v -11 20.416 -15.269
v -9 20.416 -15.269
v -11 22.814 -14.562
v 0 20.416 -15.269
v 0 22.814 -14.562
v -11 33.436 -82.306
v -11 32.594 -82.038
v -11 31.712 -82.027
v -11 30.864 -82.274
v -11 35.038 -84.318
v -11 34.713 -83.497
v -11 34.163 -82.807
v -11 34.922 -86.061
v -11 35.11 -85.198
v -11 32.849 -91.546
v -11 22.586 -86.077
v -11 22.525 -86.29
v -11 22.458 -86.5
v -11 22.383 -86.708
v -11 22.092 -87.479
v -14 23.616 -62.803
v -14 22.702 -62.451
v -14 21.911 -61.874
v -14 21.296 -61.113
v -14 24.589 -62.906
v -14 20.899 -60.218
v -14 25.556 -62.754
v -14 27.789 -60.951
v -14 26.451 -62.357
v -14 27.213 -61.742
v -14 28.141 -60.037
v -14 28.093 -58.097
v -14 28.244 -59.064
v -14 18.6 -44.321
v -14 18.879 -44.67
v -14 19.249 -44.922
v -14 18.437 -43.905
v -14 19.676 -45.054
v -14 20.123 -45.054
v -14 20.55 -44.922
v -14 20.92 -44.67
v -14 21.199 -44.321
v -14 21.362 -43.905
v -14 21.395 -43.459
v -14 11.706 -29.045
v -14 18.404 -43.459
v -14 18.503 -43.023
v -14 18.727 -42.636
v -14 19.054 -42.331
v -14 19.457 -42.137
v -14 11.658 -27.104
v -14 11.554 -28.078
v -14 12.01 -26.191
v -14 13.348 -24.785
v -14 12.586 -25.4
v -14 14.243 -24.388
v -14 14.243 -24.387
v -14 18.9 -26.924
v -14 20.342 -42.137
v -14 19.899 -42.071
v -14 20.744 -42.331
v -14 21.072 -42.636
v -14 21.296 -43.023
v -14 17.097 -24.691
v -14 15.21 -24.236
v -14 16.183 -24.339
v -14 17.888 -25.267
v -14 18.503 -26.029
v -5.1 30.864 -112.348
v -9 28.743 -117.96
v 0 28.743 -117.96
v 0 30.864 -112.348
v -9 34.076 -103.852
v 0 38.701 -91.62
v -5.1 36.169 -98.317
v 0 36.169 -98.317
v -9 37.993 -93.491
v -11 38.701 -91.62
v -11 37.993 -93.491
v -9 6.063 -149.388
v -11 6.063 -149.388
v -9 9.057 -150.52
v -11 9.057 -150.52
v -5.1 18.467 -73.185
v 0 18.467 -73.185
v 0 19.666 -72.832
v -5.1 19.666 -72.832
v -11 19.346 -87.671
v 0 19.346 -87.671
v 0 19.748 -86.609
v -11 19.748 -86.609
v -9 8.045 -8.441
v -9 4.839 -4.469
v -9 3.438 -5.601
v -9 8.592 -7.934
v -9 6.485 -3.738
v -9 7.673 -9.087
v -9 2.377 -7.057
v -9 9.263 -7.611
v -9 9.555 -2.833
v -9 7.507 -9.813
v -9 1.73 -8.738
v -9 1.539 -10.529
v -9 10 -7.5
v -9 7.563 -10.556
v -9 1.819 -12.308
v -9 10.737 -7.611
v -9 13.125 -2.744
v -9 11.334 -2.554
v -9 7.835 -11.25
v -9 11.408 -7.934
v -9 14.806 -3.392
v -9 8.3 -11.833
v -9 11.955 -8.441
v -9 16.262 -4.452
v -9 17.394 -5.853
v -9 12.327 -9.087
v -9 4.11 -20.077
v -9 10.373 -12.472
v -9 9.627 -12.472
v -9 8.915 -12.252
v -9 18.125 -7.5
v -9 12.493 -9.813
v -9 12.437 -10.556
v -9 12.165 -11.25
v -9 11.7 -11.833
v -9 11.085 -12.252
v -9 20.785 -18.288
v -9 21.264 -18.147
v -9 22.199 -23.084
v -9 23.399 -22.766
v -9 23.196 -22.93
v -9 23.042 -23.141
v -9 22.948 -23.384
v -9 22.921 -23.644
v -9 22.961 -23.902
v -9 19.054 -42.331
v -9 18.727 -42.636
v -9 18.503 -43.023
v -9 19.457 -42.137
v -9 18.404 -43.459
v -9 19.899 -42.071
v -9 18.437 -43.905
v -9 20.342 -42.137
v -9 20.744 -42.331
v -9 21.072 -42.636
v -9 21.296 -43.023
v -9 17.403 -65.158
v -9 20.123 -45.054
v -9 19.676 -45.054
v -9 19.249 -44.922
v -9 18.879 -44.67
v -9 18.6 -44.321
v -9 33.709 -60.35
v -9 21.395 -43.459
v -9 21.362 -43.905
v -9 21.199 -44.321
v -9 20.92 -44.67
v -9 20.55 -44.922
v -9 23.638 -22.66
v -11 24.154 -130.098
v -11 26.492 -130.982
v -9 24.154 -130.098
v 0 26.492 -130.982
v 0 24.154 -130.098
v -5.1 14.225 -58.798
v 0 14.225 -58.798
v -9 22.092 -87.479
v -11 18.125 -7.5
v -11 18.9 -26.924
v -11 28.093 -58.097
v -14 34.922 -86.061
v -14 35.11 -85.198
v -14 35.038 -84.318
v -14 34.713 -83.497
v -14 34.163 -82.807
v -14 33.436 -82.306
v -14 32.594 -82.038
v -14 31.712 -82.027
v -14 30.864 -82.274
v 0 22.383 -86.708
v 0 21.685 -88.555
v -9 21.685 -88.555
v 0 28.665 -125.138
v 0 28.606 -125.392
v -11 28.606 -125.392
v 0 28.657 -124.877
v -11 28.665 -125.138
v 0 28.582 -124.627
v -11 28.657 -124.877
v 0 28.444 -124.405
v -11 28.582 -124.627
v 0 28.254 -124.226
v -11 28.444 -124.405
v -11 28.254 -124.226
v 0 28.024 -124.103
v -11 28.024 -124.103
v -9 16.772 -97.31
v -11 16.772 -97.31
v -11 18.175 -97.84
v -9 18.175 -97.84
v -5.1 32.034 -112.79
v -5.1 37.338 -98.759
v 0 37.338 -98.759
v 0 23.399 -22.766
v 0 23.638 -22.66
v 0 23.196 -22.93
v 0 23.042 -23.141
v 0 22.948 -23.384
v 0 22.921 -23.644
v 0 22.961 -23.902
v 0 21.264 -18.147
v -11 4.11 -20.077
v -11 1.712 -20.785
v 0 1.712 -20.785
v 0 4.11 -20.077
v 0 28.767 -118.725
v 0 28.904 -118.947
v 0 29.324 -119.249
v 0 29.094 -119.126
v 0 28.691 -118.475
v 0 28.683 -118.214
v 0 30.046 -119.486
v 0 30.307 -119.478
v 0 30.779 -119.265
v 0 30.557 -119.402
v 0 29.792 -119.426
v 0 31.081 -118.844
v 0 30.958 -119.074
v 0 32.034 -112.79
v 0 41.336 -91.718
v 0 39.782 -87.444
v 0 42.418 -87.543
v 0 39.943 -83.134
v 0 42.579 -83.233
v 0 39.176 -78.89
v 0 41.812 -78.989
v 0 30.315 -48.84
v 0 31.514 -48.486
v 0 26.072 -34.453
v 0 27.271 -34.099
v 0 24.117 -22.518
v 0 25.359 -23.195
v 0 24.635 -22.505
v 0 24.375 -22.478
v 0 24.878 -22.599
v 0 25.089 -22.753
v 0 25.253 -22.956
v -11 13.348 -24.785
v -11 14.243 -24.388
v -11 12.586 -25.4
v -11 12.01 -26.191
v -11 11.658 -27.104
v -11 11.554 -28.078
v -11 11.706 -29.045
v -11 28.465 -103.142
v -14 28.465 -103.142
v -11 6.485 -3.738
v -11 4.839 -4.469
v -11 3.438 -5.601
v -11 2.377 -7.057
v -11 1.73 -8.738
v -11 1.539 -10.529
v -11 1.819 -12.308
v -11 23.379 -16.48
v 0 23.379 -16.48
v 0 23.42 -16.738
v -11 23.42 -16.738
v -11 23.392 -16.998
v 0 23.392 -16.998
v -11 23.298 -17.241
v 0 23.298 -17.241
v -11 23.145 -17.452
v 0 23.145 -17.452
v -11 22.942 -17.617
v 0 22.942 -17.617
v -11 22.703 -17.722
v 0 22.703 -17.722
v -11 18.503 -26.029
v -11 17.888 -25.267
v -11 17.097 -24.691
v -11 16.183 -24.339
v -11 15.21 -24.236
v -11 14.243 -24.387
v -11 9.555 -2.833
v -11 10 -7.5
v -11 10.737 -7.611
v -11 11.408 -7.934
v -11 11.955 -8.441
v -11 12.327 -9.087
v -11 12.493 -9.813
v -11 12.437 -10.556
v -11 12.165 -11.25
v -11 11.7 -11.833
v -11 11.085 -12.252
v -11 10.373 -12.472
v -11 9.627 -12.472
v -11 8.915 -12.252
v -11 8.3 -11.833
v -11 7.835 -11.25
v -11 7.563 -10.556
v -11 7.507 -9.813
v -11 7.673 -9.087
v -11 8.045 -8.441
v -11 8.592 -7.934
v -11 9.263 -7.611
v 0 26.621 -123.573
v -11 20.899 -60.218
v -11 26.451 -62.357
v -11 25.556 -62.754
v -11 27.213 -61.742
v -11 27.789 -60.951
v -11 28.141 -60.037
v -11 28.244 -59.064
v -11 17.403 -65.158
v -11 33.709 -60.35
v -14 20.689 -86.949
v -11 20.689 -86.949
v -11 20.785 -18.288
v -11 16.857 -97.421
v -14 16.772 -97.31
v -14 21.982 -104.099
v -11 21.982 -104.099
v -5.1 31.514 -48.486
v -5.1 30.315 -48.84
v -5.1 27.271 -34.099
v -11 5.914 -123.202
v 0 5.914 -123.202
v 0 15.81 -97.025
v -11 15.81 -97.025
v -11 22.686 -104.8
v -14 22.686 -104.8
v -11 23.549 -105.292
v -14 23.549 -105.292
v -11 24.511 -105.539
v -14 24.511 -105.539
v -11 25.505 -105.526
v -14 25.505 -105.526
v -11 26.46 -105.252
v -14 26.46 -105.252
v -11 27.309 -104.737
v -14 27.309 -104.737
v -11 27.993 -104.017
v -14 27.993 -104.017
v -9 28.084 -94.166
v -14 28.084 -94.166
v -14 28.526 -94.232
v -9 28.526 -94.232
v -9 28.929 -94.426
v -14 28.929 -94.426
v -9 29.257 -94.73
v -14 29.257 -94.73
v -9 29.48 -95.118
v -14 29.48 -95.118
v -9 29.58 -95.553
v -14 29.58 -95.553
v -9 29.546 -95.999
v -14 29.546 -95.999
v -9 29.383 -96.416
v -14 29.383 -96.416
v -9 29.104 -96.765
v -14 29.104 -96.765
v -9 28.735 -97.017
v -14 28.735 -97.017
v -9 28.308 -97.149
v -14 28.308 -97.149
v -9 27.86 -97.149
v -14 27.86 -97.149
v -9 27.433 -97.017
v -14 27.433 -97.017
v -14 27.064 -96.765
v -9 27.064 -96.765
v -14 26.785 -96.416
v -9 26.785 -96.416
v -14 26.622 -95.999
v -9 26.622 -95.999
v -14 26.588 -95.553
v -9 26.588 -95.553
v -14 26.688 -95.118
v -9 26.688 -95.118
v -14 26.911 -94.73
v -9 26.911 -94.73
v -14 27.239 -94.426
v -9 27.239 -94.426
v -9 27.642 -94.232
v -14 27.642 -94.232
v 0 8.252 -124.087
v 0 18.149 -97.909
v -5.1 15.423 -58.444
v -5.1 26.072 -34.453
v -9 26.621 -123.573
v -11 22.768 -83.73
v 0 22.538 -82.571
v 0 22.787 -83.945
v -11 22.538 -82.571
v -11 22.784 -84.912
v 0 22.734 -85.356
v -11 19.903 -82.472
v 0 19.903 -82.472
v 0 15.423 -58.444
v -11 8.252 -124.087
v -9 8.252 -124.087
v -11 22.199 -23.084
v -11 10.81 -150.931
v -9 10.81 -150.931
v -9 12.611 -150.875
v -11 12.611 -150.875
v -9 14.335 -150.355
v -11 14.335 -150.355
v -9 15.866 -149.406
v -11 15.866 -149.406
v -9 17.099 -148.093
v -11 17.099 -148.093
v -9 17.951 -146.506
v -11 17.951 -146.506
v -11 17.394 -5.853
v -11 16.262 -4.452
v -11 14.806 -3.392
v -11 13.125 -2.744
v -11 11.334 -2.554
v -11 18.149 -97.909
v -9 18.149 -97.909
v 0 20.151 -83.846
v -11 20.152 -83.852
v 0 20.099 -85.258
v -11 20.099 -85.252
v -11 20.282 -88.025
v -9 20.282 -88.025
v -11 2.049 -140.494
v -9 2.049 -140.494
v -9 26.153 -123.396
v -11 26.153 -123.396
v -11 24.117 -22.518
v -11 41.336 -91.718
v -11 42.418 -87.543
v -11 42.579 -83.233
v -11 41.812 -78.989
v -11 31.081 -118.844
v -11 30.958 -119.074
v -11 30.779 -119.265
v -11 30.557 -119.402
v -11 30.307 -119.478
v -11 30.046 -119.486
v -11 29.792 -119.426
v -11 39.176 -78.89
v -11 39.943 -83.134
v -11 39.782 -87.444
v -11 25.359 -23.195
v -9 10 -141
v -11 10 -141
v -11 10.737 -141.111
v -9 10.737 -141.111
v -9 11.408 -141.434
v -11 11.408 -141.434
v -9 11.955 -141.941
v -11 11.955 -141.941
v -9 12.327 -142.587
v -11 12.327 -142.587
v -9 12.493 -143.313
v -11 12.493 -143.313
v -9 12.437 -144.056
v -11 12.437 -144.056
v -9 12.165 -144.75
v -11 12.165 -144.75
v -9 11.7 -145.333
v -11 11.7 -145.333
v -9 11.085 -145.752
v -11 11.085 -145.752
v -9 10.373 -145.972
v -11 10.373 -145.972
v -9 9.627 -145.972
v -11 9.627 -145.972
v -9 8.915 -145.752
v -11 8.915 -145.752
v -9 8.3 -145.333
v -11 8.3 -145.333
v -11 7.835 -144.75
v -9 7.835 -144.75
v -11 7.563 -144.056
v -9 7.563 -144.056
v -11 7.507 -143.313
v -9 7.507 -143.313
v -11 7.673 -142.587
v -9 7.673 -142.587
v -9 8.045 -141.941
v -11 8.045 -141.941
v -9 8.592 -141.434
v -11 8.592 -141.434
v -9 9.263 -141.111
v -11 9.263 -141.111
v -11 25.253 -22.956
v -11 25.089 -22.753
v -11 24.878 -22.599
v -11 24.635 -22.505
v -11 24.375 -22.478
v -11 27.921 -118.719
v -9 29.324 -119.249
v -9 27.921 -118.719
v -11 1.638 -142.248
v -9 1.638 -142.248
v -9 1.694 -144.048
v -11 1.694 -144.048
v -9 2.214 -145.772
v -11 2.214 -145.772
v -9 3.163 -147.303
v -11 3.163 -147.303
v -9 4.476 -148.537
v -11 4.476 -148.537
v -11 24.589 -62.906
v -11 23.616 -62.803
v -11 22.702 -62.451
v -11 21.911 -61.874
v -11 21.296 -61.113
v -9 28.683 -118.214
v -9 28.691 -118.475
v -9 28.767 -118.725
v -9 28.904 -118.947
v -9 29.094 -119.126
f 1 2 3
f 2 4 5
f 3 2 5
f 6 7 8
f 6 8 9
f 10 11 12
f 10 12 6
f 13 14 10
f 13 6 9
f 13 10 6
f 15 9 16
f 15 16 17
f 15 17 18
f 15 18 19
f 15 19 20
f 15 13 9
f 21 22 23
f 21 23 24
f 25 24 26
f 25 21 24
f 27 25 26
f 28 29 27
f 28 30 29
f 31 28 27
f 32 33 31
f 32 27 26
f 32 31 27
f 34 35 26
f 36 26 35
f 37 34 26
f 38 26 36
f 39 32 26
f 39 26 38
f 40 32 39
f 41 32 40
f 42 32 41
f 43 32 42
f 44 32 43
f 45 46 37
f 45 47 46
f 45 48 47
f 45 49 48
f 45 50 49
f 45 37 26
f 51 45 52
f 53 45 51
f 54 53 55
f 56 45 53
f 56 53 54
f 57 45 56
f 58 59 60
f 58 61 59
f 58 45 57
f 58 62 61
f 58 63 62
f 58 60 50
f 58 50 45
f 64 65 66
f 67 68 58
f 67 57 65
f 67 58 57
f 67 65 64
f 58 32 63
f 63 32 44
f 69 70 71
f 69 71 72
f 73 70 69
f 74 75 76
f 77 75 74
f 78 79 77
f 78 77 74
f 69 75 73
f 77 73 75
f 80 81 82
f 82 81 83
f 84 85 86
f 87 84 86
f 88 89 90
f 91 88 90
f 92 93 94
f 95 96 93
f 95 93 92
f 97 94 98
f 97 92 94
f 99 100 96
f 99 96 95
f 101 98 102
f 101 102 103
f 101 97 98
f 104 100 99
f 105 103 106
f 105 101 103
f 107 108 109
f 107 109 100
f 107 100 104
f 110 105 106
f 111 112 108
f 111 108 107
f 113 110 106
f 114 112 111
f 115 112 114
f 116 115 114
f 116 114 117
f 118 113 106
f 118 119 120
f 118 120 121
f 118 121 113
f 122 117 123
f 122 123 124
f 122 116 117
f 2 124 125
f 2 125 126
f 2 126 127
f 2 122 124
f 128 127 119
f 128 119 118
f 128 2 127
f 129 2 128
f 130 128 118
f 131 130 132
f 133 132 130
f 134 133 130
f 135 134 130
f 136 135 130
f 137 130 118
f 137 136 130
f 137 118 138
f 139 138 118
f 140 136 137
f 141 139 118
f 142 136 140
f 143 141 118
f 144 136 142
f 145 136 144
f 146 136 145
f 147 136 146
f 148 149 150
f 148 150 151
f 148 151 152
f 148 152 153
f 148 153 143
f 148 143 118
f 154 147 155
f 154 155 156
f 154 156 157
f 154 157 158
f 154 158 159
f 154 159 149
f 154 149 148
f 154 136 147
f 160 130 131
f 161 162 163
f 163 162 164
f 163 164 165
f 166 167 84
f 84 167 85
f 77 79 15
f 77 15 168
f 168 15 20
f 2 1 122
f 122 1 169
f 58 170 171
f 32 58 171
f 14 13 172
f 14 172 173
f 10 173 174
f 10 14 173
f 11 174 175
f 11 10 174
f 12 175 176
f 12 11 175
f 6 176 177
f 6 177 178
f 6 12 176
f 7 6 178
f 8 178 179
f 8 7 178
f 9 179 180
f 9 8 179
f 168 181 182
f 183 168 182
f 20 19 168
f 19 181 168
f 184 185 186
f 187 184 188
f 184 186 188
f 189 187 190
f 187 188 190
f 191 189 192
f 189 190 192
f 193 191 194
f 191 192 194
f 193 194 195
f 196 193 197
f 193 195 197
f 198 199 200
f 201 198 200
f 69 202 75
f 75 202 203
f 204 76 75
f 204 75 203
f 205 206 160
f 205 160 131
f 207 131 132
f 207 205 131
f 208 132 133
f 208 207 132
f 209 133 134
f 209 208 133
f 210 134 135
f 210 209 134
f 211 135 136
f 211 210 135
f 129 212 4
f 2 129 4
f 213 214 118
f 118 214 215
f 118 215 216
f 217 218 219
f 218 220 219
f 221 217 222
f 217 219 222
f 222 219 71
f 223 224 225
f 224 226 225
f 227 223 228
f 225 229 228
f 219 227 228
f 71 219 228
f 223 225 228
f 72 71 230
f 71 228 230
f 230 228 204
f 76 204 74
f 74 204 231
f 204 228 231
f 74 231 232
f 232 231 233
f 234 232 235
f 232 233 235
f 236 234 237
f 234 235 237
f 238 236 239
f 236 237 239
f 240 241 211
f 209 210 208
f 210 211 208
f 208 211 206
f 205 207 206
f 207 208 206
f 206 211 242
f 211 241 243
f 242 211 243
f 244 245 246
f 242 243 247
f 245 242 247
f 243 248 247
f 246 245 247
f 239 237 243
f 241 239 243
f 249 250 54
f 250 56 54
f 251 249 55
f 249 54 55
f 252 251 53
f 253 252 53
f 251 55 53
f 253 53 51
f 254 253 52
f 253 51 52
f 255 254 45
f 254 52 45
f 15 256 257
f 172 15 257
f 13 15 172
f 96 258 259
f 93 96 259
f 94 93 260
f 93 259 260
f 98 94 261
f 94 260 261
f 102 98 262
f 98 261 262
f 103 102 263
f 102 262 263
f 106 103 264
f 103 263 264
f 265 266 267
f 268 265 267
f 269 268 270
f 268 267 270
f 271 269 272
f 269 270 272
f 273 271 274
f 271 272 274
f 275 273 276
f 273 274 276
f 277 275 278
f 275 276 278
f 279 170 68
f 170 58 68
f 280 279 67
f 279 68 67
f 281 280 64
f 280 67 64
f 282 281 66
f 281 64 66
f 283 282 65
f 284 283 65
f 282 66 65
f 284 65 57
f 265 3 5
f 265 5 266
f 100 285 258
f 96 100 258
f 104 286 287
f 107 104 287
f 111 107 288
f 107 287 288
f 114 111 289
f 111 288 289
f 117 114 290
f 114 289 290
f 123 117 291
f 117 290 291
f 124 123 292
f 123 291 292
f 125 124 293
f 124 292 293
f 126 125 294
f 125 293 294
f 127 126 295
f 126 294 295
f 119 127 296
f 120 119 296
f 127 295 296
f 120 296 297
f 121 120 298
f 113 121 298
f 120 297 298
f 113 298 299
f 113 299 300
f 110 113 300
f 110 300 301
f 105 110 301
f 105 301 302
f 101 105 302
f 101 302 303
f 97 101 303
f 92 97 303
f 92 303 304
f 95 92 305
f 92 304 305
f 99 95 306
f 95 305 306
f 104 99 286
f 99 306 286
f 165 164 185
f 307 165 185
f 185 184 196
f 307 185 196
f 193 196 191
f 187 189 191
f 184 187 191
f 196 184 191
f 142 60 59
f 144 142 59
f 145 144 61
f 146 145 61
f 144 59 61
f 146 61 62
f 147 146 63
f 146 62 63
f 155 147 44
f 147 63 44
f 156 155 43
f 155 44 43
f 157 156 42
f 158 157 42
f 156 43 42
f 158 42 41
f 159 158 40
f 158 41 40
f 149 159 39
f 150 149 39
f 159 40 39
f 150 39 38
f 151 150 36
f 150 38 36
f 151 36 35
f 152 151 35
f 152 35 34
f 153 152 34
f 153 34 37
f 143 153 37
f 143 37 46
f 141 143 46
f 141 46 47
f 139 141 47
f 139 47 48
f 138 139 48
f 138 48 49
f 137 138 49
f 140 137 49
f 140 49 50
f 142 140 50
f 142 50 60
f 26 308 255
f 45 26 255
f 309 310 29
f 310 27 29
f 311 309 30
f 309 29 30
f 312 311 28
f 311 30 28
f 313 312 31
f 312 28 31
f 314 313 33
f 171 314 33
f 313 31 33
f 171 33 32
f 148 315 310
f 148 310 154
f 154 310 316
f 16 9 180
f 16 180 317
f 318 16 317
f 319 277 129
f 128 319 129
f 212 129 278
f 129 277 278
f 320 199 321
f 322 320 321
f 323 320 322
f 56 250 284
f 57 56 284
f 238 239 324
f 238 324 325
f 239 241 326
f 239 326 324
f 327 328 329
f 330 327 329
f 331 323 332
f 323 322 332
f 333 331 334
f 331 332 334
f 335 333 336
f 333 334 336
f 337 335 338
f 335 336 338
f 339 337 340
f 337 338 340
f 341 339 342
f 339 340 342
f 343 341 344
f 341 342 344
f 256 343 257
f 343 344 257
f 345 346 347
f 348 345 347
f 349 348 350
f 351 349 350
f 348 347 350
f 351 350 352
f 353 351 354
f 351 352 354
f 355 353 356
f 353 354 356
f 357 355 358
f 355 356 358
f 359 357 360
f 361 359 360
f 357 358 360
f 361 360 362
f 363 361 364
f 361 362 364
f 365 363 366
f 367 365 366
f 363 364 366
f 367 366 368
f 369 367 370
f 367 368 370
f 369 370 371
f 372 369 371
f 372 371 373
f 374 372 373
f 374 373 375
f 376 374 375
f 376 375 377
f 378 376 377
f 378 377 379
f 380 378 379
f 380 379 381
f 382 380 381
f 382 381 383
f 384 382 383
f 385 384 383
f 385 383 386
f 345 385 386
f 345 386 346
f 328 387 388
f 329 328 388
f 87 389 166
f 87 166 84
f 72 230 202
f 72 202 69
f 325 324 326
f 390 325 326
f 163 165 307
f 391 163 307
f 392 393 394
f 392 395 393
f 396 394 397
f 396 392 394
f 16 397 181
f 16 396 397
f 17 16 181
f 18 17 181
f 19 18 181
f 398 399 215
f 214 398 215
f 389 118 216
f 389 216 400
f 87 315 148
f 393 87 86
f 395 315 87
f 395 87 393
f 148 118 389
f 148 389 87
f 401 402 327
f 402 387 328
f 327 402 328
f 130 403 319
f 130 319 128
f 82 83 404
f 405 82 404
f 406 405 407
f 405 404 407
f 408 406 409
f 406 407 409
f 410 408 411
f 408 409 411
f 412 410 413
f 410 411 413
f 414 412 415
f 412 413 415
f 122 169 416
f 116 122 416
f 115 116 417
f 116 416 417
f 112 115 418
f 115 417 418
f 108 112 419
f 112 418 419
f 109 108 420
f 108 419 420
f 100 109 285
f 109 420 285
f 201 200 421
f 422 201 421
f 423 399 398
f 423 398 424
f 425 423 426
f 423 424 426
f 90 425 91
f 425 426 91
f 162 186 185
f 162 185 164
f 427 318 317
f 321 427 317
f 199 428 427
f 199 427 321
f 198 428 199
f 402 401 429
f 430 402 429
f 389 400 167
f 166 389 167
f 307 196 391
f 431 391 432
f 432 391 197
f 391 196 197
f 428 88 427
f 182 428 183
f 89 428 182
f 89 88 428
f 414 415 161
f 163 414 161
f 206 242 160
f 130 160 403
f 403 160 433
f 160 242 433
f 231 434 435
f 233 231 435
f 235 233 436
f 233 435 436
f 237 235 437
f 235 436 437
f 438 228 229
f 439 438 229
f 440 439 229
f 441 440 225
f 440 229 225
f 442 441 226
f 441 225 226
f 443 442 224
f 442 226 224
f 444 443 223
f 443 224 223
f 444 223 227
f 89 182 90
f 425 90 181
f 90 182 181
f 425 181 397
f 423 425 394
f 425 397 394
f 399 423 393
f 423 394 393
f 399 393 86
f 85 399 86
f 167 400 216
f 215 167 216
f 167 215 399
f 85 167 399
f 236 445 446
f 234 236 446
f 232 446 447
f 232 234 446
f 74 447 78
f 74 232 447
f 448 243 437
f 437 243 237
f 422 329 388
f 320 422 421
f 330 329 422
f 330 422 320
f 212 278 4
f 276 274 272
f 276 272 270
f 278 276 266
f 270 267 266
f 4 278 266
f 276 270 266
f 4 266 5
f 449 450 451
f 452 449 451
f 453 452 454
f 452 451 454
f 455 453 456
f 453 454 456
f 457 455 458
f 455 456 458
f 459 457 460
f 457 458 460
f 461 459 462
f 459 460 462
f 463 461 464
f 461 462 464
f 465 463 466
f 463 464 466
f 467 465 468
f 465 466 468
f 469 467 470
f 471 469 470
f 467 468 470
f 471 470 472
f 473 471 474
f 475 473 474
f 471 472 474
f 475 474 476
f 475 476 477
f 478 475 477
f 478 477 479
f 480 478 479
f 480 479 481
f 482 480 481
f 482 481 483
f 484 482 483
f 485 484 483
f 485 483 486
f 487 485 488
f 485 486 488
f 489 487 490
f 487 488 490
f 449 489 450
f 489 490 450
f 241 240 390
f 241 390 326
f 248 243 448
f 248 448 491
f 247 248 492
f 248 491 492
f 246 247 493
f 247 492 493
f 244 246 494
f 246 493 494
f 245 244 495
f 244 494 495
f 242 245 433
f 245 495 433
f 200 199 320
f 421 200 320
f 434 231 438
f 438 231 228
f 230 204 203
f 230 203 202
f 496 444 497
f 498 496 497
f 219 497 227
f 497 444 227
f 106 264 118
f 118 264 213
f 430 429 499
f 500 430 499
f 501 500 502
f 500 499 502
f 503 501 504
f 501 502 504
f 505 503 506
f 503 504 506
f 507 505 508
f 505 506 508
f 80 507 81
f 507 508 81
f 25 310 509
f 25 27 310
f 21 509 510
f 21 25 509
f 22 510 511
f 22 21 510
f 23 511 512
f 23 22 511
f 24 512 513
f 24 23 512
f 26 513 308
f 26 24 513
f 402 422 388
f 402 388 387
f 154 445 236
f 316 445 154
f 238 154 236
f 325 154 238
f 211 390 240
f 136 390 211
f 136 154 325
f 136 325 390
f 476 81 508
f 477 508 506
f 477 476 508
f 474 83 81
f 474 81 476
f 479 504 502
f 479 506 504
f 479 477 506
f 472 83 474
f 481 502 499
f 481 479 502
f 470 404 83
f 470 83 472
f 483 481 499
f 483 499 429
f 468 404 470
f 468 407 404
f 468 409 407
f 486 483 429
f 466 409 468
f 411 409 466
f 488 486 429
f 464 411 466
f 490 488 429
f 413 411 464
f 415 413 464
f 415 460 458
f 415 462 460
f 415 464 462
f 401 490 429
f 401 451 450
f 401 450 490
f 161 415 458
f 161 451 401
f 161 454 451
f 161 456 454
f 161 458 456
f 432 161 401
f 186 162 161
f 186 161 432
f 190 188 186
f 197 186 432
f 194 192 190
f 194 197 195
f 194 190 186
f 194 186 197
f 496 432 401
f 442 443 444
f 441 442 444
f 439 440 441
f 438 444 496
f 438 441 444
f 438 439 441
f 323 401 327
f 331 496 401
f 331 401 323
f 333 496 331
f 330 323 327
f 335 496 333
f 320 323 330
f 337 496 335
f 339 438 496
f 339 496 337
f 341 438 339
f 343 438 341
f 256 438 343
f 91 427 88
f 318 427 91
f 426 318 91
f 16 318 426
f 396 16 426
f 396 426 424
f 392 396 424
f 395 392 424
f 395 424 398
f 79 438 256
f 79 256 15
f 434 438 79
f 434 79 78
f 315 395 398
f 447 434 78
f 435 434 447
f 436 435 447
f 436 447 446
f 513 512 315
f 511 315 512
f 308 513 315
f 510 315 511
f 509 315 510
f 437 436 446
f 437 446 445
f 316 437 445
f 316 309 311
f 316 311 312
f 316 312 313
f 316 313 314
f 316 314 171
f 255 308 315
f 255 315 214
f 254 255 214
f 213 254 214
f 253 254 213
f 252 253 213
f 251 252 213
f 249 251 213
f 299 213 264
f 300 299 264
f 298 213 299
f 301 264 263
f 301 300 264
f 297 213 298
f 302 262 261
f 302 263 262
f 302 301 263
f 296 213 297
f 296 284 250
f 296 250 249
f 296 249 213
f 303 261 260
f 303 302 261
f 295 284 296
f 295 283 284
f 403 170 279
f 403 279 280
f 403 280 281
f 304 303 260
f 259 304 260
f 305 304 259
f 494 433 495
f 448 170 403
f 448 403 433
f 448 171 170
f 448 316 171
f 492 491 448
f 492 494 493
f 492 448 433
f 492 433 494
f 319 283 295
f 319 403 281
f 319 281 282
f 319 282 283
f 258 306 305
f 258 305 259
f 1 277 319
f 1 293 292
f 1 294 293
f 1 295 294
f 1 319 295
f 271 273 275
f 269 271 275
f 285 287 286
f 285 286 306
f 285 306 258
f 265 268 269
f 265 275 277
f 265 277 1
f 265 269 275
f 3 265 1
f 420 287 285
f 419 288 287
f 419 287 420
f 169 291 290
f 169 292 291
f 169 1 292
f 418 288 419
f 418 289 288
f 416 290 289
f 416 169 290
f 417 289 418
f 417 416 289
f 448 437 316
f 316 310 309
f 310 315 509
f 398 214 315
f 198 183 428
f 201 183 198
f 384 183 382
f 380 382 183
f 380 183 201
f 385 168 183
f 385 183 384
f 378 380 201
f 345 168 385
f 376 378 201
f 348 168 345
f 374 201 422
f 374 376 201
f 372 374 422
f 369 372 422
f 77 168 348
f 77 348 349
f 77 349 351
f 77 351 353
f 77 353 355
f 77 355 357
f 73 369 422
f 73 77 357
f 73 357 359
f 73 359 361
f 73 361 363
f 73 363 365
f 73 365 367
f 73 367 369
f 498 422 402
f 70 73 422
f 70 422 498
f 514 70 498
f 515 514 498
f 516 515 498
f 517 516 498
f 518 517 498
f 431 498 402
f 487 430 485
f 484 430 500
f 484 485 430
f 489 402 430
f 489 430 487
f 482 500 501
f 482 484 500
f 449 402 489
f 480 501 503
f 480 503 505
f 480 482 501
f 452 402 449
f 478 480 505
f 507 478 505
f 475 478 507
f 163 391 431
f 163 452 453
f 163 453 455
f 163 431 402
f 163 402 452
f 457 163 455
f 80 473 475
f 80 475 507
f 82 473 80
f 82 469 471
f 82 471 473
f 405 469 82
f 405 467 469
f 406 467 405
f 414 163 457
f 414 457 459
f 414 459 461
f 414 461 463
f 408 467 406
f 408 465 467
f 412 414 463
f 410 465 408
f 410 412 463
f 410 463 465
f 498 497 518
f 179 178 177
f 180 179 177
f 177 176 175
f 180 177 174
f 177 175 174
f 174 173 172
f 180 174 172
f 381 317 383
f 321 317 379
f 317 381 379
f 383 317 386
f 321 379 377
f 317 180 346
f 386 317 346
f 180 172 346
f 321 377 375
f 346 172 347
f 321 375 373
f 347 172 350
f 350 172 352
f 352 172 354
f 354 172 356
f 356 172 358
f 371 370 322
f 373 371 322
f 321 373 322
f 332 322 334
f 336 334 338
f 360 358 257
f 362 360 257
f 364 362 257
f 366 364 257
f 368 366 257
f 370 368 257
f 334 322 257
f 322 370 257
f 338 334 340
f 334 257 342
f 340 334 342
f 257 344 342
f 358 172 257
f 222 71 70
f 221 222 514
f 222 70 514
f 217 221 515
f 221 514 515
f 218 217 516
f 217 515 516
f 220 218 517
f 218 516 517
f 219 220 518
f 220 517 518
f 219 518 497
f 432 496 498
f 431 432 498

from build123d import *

# Parameters (mm, degrees)
SWEEP1_PROFILE_R        = 11
CUT_EXTRUDE1_DEPTH      = 139.5211963076765
CUT_EXTRUDE1_DEPTH_BACK = 139.5211963076765
BOSS_EXTRUDE1_DEPTH     = 11
BOSS_EXTRUDE4_DEPTH     = 11
SHELL1_START            = -11
SHELL1_DEPTH            = 11
SHELL1_START_2          = -113.150665538
SHELL1_2_DEPTH          = 47.855548818
SHELL1_START_3          = 20.420083618
SHELL1_3_DEPTH          = 73.048431747
FILLET1_R               = 6.5
BOSS_EXTRUDE2_DEPTH     = 3
CUT_EXTRUDE2_DEPTH      = 13.000000000000002
SKETCH21_R              = 2.499999999999935
SKETCH21_R_2            = 2.499999999999995
BOSS_EXTRUDE3_DEPTH     = 2
SKETCH22_R              = 1.4999999999999973
SKETCH22_R_2            = 1.5000000000000042
CUT_EXTRUDE3_DEPTH      = 13.000000000000002
FILLET2_R               = 3.75
CUT_EXTRUDE4_DEPTH      = 3
FILLET3_R               = 20
CUT_EXTRUDE5_DEPTH      = 3
FILLET4_R               = 1
CUT_EXTRUDE6_DEPTH      = 158.49217492446147
CUT_EXTRUDE7_DEPTH      = 5.1


with BuildPart() as part:
    # Sweep1: sweep along a path in Sketch6
    with BuildLine(Plane(origin=(0, 0, 0), x_dir=(0, 0, -1), z_dir=(1, 0, 0))) as sweep1_path:
        Line((17.67333262983066, 12.262734264551655), (84.99999999999999, 32.11621443102775))
        Line((84.99999999999999, 32.11621443102775), (127.09238599616681, 16.202979651458282))
    # Sweep1 profile (on start of the path) → Sweep1 (sweep)
    with BuildSketch(Plane(origin=(0, 12.262734264551655, -17.67333262983066), x_dir=(0, -0.9591665787285488, -0.28284178306991825), z_dir=(0, 0.28284178306991825, -0.9591665787285488))):
        Circle(SWEEP1_PROFILE_R)
    sweep(path=sweep1_path.line, transition=Transition.RIGHT)

    # Sketch13 → Cut-Extrude1 (cut, two sides: drawn at the far end of the back side and taken through both)
    with BuildSketch(Plane(origin=(0, 0, 0), x_dir=(1, 0, 0), z_dir=(0, 1, 0)).offset(-CUT_EXTRUDE1_DEPTH_BACK)):
        Polygon((-1.735e-14, 141.7207506217034), (-10.000000000000018, 141.7207506217034), (-10, -2.41e-15), (0, -1.18e-15), align=None)
    extrude(amount=CUT_EXTRUDE1_DEPTH + CUT_EXTRUDE1_DEPTH_BACK, mode=Mode.SUBTRACT)


with BuildPart() as cut_extrude1_piece_1:
    # of the separate pieces the step leaves, piece 1, a body of its own (cut_extrude1_pieces)
    add(part.part.solids().sort_by_distance((0, 22.813566631, -14.562073016))[0])



with BuildPart() as cut_extrude1_piece_2:
    # of the separate pieces the step leaves, piece 2, a body of its own (cut_extrude1_pieces)
    add(part.part.solids().sort_by_distance((-10, 7.867280813, -18.96947651))[0])


with BuildPart() as cut_extrude1_piece_1_1:
    add(cut_extrude1_piece_1.part)

    add(cut_extrude1_piece_2.part)  # Boss-Extrude1 merges Cut-Extrude1 piece 2
    # Sketch17 → Boss-Extrude1 (add)
    with BuildSketch(Plane(origin=(0, 0, 0), x_dir=(0, 0, -1), z_dir=(1, 0, 0))):
        Polygon((14.562073016061587, 22.813566630565735), (85.43326002077312, 43.71226488094253), (130.98228783117273, 26.4922295616324), (123.20248416116098, 5.91372974128417), (84.56673997922682, 20.52016398111302), (20.78459224359979, 1.7119018985376593), align=None)
    extrude(amount=-BOSS_EXTRUDE1_DEPTH)

    # Sketch24 → Boss-Extrude4 (add)
    with BuildSketch(Plane(origin=(0, 0, 0), x_dir=(0, 0, -1), z_dir=(1, 0, 0))):
        Polygon((127.09238599616687, 16.20297965145829), (84.99999999999997, 32.11621443102777), (17.673332629830696, 12.2627342645517), (14.5620730160616, 22.813566630565738), (85.43326002077312, 43.71226488094253), (130.98228783117273, 26.4922295616324), align=None)
    extrude(amount=BOSS_EXTRUDE4_DEPTH)

    # Shell1: read off the stored shape, not the designer's step
    # Shell1 outline → Shell1 (cut)
    with BuildSketch(Plane.YZ.offset(SHELL1_START)):
        Polygon((4.109818345, -20.077487786), (23.155629992, -84.665208166), (8.25219563, -124.08655276), (24.153763673, -130.098219232), (41.07679887, -85.334791834), (20.415650184, -15.269177474), align=None)
    extrude(amount=SHELL1_DEPTH, mode=Mode.SUBTRACT)

    # Shell1 2 outline → Shell1 2 (cut)
    with BuildSketch(Plane(origin=(0, 0, 0), x_dir=(1, 0, 0), z_dir=(0, 0.353627439545988, 0.935386355470374)).offset(SHELL1_START_2)):
        with BuildLine():
            ThreePointArc((0, 51.59940113), (6.01040764, 54.088993489), (8.5, 60.09940113))
            Line((8.5, 60.09940113), (8.5, 68.59940113))
            Line((8.5, 68.59940113), (0, 68.59940113))
            Line((0, 68.59940113), (0, 51.59940113))
        make_face()
    extrude(amount=SHELL1_2_DEPTH, mode=Mode.SUBTRACT)

    # Shell1 3 outline → Shell1 3 (cut)
    with BuildSketch(Plane(origin=(0, 0, 0), x_dir=(1, 0, 0), z_dir=(0, 0.2828417830699179, -0.9591665787285488)).offset(SHELL1_START_3)):
        with BuildLine():
            Line((8.5, -15.263247957), (8.5, -6.763247957))
            ThreePointArc((8.5, -6.763247957), (6.01040764, -0.752840317), (0, 1.736752043))
            Line((0, 1.736752043), (0, -15.263247957))
            Line((0, -15.263247957), (8.5, -15.263247957))
        make_face()
    extrude(amount=SHELL1_3_DEPTH, mode=Mode.SUBTRACT)

    # Fillet1
    fillet1_edges = [cut_extrude1_piece_1_1.edges().sort_by_distance(p)[0] for p in [
        (7.881335387835811, 24.026781093815067, -84.69775674305134),
        (6.090122796410721, 25.865288676138242, -84.76644839135132),
        (-5.5, 23.155629992, -84.665208166),
        (-5.5, 20.52016398111302, -84.56673997922682),
    ]]
    fillet(fillet1_edges, radius=FILLET1_R)

    # Sketch19 → Boss-Extrude2 (add)
    with BuildSketch(Plane(origin=(-11, 0, 0), x_dir=(0, 0, -1), z_dir=(1, 0, 0))):
        Polygon((23.326841994418306, 17.839501416273155), (61.69350514356026, 29.153172739069877), (63.814818516584644, 21.959423398605768), (25.44815536744269, 10.645752075809039), align=None)
        with BuildLine():
            Line((82.27394375020691, 30.863769892150234), (86.9487114072542, 20.688724856427108))
            Line((86.9487114072542, 20.688724856427108), (97.3098397387939, 16.771649028602706))
            Line((97.3098397387939, 16.771649028602706), (109.44211139391379, 26.082981771484846))
            Line((109.44211139391379, 26.082981771484846), (86.06088152658778, 34.92237140237257))
            ThreePointArc((86.06088152658778, 34.92237140237257), (82.80654161714303, 34.162852377504095), (82.27394375020691, 30.863769892150234))
        make_face()
    extrude(amount=-BOSS_EXTRUDE2_DEPTH)


with BuildPart() as boss_extrude2_piece_1:
    # of the separate pieces the step leaves, piece 1, a body of its own (boss_extrude2_pieces)
    add(cut_extrude1_piece_1_1.part.solids().sort_by_distance((-1e-09, 22.538001125, -82.570719291))[0])

    # Sketch20 → Cut-Extrude2 (cut)
    with BuildSketch(Plane(origin=(0, 45.92690987835062, -17.362895504685262), x_dir=(1, 0, 0), z_dir=(0, -0.9353863554703739, 0.3536274395459883))):
        Polygon((-11.00000000000001, -75.16519001409192), (3.999999999999988, -75.16519001409192), (3.9999999999999916, -85.1651900140919), (-11.00000000000001, -85.1651900140919), align=None)
    extrude(amount=-CUT_EXTRUDE2_DEPTH, mode=Mode.SUBTRACT)



with BuildPart() as boss_extrude2_piece_2:
    # of the separate pieces the step leaves, piece 2, a body of its own (boss_extrude2_pieces)
    add(cut_extrude1_piece_1_1.part.solids().sort_by_distance((-11, 17.839501416, -23.326841994))[0])


with BuildPart() as boss_extrude2_piece_1_1:
    add(boss_extrude2_piece_1.part)

    add(boss_extrude2_piece_2.part)  # Boss-Extrude3 merges Boss-Extrude2 piece 2
    # Sketch21 → Boss-Extrude3 (add)
    # profile 1 of 2: a face of its own
    with BuildSketch(Plane.ZY.offset(11)):
        with BuildLine():
            Line((-59.92574399937327, 35.14796385612329), (-14.844914799131477, 21.85440005183715))
            Line((-14.844914799131477, 21.85440005183715), (-15.269177473736278, 20.4156501837443))
            Line((-15.269177473736278, 20.4156501837443), (-7.49992818603503, 18.124631740877966))
            ThreePointArc((-7.49992818603503, 18.124631740877966), (-3.391731998282636, 14.806195907785265), (-2.833287095990472, 9.554774044468546))
            Line((-2.833287095990472, 9.554774044468546), (-3.738380801814209, 6.4854409925371845))
            ThreePointArc((-3.738380801814209, 6.4854409925371845), (-7.056816634906908, 2.377244804784792), (-12.308238498223627, 1.8187999024926287))
            Line((-12.308238498223627, 1.8187999024926287), (-20.07748778592488, 4.1098183453589545))
            Line((-20.07748778592488, 4.1098183453589545), (-20.501750460529845, 2.6710684772661613))
            Line((-20.501750460529845, 2.6710684772661613), (-65.58257966077163, 15.964632281552323))
            Line((-65.58257966077163, 15.964632281552323), (-59.92574399937327, 35.14796385612329))
        make_face()
        with Locations((-10.000000000002185, 9.999999999992289)):
            Circle(SKETCH21_R, mode=Mode.SUBTRACT)
    # profile 2 of 2: a face of its own
    with BuildSketch(Plane.ZY.offset(11)):
        with BuildLine():
            Line((-97.3098397387939, 16.771649028602706), (-97.8402808981129, 18.1747285618083))
            Line((-97.8402808981129, 18.1747285618083), (-140.4938987075619, 2.049317318511217))
            ThreePointArc((-140.4938987075619, 2.049317318511217), (-145.77235119424373, 2.21433744231316), (-149.3880938931748, 6.0634538383894725))
            Line((-149.3880938931748, 6.0634538383894725), (-150.519701699722, 9.056690175894678))
            ThreePointArc((-150.519701699722, 9.056690175894678), (-150.35468157592004, 14.33514266257649), (-146.50556517984373, 17.95088536150758))
            Line((-146.50556517984373, 17.95088536150758), (-103.85194737039468, 34.07629660480464))
            Line((-103.85194737039468, 34.07629660480464), (-104.38238852971367, 35.479376138010196))
            Line((-104.38238852971367, 35.479376138010196), (-94.02126019817398, 39.39645196583461))
            Line((-94.02126019817398, 39.39645196583461), (-86.9487114072542, 20.688724856427108))
            Line((-86.9487114072542, 20.688724856427108), (-97.3098397387939, 16.771649028602706))
        make_face()
        with Locations((-143.4999999999837, 10.000000000006171)):
            Circle(SKETCH21_R_2, mode=Mode.SUBTRACT)
    extrude(amount=-BOSS_EXTRUDE3_DEPTH)

    # Sketch22 → Cut-Extrude3 (cut)
    with BuildSketch(Plane.ZY.offset(13.999999999999998)):
        with Locations((-95.66554996848392, 28.084050497218655)):
            Circle(SKETCH22_R)
        with Locations((-43.57083025550148, 19.89946240743944)):
            Circle(SKETCH22_R_2)
    extrude(amount=-CUT_EXTRUDE3_DEPTH, mode=Mode.SUBTRACT)

    # Fillet2
    fillet2_edges = [boss_extrude2_piece_1_1.edges().sort_by_distance(p)[0] for p in [
        (-12.5, 10.645752075809039, -25.44815536744269),
        (-12.5, 17.839501416273155, -23.326841994418306),
        (-12.5, 21.959423398605768, -63.814818516584644),
        (-12.5, 29.153172739069877, -61.69350514356026),
        (-12.5, 26.082981771484846, -109.44211139391379),
    ]]
    fillet(fillet2_edges, radius=FILLET2_R - 0.0001)  # a hair under: the kernel refuses the full size

    # Sketch23 → Cut-Extrude4 (cut)
    with BuildSketch(Plane(origin=(0, 17.03791376961812, 5.024188725151693), x_dir=(1, 0, 0), z_dir=(0, 0.9591665787285488, 0.28284178306991814))):
        Polygon((-11, 23.42008361798458), (8, 23.42008361798471), (8, 28.420083617984712), (-11, 28.420083617984712), align=None)
    extrude(amount=-CUT_EXTRUDE4_DEPTH, mode=Mode.SUBTRACT)

    # Fillet3
    fillet3_edges = [boss_extrude2_piece_1_1.edges().sort_by_distance(p)[0] for p in [
        (0, 43.71226488094253, -85.43326002077312),
        (-5.5, 41.07679887, -85.334791834),
    ]]
    fillet(fillet3_edges, radius=FILLET3_R)

    # Sketch25 → Cut-Extrude5 (cut)
    with BuildSketch(Plane(origin=(0, 66.50540969869883, -25.142699174696986), x_dir=(1, 0, 0), z_dir=(0, 0.9353863554703739, -0.3536274395459882))):
        Polygon((-11, 101.17418781590268), (8, 101.17418781590271), (8, 106.17418781590271), (-11, 106.17418781590268), align=None)
    extrude(amount=-CUT_EXTRUDE5_DEPTH, mode=Mode.SUBTRACT)

    # Fillet4
    fillet4_edges = [boss_extrude2_piece_1_1.edges().sort_by_distance(p)[0] for p in [
        (-4.5, 22.678384448496875, -22.942510103507807),
        (-1.5, 23.66209197977548, -17.439572752247173),
        (8, 24.36919643745029, -19.837489199068607),
        (-1.5, 25.076300895125087, -22.235405645889983),
        (-4.5, 28.388974824561164, -118.89558538463223),
        (-1.5, 30.72744071321624, -119.77965398348931),
        (8, 29.84337211435127, -122.11811987216527),
        (-1.5, 28.959303515486297, -124.45658576084118),
    ]]
    fillet(fillet4_edges, radius=FILLET4_R)

    # Sketch26 → Cut-Extrude6 (cut, through all)
    with BuildSketch(Plane(origin=(0, 0, 0), x_dir=(0, 0, -1), z_dir=(1, 0, 0))):
        Polygon((-14.446633314427679, 64.99999999999999), (165.5533666855723, 65.00000000000001), (165.55336668557234, -24.99999999999997), (-14.446633314427677, -25.000000000000004), align=None)
    extrude(amount=CUT_EXTRUDE6_DEPTH, mode=Mode.SUBTRACT)

    # Sketch27 → Cut-Extrude7 (cut)
    with BuildSketch(Plane(origin=(0, 0, 0), x_dir=(0, 0, -1), z_dir=(1, 0, 0))):
        Polygon((34.45250904830736, 26.07248584514273), (34.09895681946996, 27.271444068553414), (48.486455500398186, 31.514070814602224), (48.840007729235595, 30.315112591191493), align=None)
        Polygon((58.44415093506696, 15.423489668155758), (58.79770316390435, 14.224531444745072), (73.1852018448326, 18.46715819079385), (72.8316496159952, 19.66611641420453), align=None)
        Polygon((98.3170855642761, 36.16877849455206), (98.75911986370858, 37.33801143889003), (112.78991519576418, 32.03359984570021), (112.34788089633173, 30.864366901362228), align=None)
    extrude(amount=-CUT_EXTRUDE7_DEPTH, mode=Mode.SUBTRACT)


solid = boss_extrude2_piece_1_1.part
